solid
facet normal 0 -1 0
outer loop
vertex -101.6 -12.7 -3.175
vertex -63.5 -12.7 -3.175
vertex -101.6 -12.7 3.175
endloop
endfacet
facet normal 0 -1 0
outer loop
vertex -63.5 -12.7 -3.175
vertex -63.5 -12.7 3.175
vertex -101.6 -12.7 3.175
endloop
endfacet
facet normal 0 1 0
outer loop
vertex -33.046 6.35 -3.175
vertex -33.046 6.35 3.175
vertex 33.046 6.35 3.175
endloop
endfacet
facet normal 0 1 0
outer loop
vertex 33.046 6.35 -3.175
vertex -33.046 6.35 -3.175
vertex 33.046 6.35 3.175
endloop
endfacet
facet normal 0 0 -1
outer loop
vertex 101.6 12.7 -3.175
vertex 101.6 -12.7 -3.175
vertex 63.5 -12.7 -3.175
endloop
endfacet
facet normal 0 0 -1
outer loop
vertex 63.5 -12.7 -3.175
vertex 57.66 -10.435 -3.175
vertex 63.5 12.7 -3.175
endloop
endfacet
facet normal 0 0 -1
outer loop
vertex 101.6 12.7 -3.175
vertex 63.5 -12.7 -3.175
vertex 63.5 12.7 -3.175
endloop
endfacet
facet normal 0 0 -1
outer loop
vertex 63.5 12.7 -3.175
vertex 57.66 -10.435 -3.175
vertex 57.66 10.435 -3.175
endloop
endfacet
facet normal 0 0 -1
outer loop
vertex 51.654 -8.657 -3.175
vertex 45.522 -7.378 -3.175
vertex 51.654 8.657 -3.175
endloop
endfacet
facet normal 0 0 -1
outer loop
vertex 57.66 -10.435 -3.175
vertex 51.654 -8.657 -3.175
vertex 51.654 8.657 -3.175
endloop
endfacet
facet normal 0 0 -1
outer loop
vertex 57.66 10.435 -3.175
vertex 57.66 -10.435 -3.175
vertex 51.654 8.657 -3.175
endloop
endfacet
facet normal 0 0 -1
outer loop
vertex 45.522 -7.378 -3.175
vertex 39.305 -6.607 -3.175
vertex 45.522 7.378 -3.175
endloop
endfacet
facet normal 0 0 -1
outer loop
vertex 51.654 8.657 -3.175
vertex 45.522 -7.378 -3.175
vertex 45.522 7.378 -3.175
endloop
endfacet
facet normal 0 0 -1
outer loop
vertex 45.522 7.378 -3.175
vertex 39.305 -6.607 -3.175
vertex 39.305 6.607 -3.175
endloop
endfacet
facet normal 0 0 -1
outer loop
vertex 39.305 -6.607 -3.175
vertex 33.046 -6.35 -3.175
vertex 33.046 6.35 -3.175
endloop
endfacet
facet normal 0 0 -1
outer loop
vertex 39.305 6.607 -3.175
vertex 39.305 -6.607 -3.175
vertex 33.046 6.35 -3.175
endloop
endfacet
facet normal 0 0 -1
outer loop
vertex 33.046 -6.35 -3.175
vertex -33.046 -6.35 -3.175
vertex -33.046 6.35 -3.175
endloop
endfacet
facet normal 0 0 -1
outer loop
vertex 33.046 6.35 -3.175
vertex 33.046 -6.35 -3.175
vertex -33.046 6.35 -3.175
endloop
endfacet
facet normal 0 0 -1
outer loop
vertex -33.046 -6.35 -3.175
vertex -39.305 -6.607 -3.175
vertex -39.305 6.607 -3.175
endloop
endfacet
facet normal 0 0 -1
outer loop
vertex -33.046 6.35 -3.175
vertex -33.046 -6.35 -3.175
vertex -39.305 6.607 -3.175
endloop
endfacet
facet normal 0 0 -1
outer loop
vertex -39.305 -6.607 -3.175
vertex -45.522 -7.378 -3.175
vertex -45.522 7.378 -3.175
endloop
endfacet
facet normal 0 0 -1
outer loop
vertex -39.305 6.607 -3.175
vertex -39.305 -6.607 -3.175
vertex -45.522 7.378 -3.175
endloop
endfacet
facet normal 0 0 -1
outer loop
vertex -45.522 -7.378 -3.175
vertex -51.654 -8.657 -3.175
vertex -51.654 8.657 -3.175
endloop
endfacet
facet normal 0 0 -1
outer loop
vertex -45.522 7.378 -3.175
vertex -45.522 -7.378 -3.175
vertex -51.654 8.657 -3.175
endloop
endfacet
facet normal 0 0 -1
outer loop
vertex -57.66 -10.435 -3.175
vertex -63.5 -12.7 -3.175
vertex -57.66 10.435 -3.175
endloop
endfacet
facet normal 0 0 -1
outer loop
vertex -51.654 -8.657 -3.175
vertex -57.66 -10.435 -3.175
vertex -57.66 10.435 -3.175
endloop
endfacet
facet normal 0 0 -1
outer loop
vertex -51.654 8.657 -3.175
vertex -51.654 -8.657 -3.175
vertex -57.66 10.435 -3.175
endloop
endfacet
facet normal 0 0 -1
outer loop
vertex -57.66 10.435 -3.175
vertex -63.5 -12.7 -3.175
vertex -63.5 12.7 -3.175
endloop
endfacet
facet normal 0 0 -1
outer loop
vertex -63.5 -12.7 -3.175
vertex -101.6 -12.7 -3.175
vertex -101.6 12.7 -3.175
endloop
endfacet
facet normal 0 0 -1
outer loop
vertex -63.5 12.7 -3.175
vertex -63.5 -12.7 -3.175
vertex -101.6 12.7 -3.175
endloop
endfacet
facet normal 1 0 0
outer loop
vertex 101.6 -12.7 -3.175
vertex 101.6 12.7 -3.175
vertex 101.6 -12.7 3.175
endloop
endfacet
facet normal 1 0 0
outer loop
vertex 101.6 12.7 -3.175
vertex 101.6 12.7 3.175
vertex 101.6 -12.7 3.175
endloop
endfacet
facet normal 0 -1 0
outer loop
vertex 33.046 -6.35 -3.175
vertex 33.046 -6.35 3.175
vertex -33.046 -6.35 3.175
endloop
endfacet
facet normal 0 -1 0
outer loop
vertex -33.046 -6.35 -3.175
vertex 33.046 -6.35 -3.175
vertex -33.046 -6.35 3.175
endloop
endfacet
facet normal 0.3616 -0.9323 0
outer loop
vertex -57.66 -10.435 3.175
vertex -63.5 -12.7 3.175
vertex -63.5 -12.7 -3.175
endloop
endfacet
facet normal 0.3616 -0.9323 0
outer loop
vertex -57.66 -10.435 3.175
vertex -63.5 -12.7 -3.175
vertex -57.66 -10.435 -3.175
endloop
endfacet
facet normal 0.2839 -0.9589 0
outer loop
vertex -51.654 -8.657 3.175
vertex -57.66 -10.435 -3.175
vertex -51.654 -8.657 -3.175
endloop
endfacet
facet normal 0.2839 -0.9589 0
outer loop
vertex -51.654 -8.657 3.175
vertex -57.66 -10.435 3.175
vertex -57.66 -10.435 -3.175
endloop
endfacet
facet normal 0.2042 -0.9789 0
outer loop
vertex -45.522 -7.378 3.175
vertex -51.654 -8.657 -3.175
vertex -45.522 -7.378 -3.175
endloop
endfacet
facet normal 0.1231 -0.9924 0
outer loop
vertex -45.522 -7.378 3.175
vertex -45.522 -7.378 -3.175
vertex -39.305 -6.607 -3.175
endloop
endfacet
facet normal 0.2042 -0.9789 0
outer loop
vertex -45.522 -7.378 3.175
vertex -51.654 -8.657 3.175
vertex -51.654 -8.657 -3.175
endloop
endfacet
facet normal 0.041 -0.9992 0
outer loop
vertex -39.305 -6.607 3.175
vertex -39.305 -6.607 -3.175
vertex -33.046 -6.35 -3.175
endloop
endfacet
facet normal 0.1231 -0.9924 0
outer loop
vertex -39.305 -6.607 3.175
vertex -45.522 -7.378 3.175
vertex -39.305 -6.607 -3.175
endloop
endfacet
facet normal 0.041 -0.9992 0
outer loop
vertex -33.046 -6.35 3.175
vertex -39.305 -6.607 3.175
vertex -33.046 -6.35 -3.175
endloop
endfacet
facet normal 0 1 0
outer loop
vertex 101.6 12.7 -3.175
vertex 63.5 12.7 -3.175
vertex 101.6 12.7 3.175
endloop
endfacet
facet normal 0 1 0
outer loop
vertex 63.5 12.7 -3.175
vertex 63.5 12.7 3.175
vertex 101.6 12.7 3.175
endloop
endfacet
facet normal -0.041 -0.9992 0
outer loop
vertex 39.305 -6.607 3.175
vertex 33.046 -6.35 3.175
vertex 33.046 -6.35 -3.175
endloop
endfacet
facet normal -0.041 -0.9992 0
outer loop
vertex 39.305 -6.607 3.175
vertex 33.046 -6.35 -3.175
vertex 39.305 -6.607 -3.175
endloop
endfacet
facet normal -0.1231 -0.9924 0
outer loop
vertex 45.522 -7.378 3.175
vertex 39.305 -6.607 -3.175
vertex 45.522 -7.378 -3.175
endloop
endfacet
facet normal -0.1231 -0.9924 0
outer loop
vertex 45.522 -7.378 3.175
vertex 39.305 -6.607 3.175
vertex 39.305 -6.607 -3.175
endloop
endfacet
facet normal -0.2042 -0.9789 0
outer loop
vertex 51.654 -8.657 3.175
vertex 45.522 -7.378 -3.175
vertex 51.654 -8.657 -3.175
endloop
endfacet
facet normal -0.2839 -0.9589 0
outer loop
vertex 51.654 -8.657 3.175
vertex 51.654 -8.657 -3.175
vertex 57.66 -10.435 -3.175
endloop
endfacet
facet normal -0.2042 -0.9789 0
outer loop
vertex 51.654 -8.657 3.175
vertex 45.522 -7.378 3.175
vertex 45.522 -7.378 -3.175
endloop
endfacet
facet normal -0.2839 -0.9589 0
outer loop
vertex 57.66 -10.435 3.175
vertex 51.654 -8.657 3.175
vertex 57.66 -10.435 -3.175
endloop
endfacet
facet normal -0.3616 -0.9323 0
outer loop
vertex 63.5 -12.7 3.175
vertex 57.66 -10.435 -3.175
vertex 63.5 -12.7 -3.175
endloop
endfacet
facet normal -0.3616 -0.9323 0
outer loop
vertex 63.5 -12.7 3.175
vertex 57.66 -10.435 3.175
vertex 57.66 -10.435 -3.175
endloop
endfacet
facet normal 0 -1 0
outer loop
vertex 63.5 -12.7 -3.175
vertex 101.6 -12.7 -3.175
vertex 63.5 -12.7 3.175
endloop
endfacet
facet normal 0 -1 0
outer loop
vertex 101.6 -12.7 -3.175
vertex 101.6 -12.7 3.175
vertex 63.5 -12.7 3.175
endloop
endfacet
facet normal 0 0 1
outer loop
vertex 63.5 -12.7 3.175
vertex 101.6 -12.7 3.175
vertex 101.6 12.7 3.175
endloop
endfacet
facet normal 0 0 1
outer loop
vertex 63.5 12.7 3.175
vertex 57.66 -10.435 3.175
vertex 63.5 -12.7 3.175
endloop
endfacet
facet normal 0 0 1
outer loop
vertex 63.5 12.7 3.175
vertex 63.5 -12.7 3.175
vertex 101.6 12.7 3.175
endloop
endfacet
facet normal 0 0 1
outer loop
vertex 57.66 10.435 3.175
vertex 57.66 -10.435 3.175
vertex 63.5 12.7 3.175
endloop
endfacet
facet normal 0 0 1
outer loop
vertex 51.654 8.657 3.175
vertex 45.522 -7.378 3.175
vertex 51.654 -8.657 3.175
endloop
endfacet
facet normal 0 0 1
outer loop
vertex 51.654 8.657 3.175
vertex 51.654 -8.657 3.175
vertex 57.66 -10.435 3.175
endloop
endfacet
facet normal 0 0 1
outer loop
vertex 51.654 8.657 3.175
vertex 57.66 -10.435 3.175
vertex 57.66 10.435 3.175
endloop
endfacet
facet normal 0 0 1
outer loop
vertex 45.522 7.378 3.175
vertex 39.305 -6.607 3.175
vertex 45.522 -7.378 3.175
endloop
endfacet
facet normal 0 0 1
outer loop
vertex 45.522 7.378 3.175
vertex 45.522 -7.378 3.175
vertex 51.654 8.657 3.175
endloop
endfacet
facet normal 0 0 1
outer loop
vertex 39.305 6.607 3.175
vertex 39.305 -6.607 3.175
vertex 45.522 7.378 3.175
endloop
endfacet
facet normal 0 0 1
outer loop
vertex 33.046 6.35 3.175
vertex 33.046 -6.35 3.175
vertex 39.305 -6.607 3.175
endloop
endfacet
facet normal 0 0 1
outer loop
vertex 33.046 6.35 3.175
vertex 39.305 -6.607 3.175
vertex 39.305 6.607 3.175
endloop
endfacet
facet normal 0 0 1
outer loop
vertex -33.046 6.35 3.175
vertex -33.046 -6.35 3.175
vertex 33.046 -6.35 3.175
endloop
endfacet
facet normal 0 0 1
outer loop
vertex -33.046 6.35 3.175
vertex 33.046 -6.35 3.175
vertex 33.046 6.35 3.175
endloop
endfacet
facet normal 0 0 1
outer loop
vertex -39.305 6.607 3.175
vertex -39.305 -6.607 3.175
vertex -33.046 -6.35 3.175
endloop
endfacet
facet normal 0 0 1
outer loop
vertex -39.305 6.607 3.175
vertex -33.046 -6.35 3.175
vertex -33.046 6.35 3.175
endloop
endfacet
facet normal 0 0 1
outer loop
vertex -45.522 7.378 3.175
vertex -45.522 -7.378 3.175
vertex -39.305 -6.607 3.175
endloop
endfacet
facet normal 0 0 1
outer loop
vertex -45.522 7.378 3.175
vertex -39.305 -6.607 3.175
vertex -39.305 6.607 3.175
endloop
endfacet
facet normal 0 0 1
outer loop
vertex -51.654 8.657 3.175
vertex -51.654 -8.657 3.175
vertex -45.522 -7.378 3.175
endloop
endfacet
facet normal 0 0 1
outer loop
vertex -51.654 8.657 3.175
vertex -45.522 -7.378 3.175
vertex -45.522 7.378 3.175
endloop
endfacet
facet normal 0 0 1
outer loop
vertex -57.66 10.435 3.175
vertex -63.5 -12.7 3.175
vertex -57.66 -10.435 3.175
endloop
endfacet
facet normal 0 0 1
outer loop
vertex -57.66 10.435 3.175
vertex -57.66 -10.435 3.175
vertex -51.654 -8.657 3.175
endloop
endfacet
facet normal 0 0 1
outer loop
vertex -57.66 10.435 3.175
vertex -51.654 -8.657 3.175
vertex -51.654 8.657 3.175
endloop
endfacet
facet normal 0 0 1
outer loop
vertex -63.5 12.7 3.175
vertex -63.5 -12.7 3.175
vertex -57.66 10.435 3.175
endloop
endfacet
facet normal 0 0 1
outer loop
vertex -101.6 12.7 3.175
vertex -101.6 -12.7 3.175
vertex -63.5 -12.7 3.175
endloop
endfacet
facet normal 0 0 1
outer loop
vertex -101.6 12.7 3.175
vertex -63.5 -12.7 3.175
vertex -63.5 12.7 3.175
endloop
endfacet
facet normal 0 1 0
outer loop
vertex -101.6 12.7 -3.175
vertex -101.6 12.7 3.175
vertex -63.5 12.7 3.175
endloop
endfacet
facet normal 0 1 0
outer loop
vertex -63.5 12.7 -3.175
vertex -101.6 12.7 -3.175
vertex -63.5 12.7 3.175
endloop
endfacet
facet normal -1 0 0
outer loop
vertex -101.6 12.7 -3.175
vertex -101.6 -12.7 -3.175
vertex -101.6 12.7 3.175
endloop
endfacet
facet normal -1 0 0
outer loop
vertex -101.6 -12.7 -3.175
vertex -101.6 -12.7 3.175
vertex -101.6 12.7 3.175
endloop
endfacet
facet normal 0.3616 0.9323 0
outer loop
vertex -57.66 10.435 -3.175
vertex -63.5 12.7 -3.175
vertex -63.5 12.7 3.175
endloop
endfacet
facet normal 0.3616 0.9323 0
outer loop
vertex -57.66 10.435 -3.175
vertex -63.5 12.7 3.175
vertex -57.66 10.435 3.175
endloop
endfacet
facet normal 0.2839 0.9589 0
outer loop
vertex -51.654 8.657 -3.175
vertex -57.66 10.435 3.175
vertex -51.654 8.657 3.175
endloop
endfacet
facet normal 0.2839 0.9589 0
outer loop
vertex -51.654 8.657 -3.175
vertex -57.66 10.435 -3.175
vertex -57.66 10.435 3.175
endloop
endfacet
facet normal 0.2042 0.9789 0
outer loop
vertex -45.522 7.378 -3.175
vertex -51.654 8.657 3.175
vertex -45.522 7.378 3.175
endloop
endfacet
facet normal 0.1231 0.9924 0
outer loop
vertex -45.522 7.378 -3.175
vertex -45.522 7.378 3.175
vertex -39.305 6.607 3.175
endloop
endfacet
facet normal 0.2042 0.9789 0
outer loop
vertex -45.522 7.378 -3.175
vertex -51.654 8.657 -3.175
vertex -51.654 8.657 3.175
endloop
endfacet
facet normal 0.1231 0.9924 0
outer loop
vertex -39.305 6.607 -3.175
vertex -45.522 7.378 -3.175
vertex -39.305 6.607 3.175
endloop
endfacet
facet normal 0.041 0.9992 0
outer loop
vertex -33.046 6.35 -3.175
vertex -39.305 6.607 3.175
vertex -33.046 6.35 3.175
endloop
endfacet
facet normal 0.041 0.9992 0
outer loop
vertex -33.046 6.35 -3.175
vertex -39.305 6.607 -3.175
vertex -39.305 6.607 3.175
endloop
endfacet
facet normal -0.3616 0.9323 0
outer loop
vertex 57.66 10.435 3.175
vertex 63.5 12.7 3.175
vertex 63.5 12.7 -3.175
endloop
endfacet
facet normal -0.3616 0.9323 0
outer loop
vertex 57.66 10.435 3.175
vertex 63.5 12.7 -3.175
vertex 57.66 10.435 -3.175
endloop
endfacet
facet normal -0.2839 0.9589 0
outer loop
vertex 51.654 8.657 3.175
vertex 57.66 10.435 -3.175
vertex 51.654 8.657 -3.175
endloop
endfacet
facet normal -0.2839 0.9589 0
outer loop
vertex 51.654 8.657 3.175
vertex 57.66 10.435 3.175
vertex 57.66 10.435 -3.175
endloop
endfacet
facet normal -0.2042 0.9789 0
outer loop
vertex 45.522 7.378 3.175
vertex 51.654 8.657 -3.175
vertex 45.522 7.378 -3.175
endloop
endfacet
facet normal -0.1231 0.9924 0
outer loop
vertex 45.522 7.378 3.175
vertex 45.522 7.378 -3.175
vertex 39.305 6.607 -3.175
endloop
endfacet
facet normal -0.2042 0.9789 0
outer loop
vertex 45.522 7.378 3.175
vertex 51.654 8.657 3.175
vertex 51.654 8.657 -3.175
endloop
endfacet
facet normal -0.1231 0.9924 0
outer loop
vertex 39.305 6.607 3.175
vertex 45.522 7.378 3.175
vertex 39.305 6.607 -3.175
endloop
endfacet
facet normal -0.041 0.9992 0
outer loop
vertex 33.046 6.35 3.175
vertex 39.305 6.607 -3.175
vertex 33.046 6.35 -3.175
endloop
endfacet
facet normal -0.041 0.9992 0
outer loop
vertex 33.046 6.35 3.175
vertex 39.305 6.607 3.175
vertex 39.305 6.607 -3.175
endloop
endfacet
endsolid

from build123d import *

# Parameters (mm, degrees)
F_1_4_INCH_THICKNESS_DEPTH = 3.175
FILLET1_R                  = 76.2


with BuildPart() as part:
    # Sketch1 → 1/4 Inch Thickness (new, symmetric)
    with BuildSketch(Plane.XY):
        Polygon((-63.5, 6.35), (63.5, 6.35), (63.5, 12.7), (101.6, 12.7), (101.6, -12.7), (63.5, -12.7), (63.5, -6.35), (-63.5, -6.35), (-63.5, -12.7), (-101.6, -12.7), (-101.6, 12.7), (-63.5, 12.7), align=None)
    extrude(amount=F_1_4_INCH_THICKNESS_DEPTH, both=True)

    # Fillet1
    # the kernel refuses this fillet: 76.2 mm, written as the material it adds along each edge
    with BuildSketch(Plane(origin=(63.5, -6.35, 3.175), x_dir=(-1, 0, 0), z_dir=(0, 0, -1))) as fillet1_piece_1:
        with BuildLine():
            CenterArc((30.453530173, -76.2), FILLET1_R, 90, 23.556464309)
            Line((0, -6.35), (-0.609070603, -4.953))
            ThreePointArc((-0.609070603, -4.953), (-1.524, -3.175), (-1.524, 0))
            Line((-1.524, 0), (0, 1.524))
            Line((0, 1.524), (30.453530173, 1.524))
            Line((30.453530173, 1.524), (30.453530173, 0))
        make_face()
    extrude(amount=6.35)
    with BuildSketch(Plane(origin=(63.5, 6.35, 3.175), x_dir=(-1, 0, 0), z_dir=(0, 0, -1)), Plane(origin=(-63.5, 6.35, -3.175), x_dir=(1, 0, 0), z_dir=(0, 0, 1))) as fillet1_piece_2:
        with BuildLine():
            CenterArc((30.453530173, 76.2), FILLET1_R, 246.443535691, 23.556464309)
            Line((0, 6.35), (-0.609070603, 4.953))
            ThreePointArc((-0.609070603, 4.953), (-1.524, 3.175), (-1.524, 0))
            Line((-1.524, 0), (0, -1.524))
            Line((0, -1.524), (30.453530173, -1.524))
            Line((30.453530173, -1.524), (30.453530173, 0))
        make_face()
    extrude(amount=6.35)
    with BuildSketch(Plane(origin=(-63.5, -6.35, 3.175), x_dir=(0, -1, 0), z_dir=(0, 0, -1))) as fillet1_piece_3:
        with BuildLine():
            CenterArc((76.2, -30.453530173), FILLET1_R, 156.443535691, 23.556464309)
            Line((0, -30.453530173), (-1.524, -30.453530173))
            Line((-1.524, -30.453530173), (-1.524, 0))
            Line((-1.524, 0), (0, 1.524))
            ThreePointArc((0, 1.524), (3.175, 1.524), (4.953, 0.609070603))
            Line((4.953, 0.609070603), (6.35, 0))
        make_face()
    extrude(amount=6.35)


solid = part.part
